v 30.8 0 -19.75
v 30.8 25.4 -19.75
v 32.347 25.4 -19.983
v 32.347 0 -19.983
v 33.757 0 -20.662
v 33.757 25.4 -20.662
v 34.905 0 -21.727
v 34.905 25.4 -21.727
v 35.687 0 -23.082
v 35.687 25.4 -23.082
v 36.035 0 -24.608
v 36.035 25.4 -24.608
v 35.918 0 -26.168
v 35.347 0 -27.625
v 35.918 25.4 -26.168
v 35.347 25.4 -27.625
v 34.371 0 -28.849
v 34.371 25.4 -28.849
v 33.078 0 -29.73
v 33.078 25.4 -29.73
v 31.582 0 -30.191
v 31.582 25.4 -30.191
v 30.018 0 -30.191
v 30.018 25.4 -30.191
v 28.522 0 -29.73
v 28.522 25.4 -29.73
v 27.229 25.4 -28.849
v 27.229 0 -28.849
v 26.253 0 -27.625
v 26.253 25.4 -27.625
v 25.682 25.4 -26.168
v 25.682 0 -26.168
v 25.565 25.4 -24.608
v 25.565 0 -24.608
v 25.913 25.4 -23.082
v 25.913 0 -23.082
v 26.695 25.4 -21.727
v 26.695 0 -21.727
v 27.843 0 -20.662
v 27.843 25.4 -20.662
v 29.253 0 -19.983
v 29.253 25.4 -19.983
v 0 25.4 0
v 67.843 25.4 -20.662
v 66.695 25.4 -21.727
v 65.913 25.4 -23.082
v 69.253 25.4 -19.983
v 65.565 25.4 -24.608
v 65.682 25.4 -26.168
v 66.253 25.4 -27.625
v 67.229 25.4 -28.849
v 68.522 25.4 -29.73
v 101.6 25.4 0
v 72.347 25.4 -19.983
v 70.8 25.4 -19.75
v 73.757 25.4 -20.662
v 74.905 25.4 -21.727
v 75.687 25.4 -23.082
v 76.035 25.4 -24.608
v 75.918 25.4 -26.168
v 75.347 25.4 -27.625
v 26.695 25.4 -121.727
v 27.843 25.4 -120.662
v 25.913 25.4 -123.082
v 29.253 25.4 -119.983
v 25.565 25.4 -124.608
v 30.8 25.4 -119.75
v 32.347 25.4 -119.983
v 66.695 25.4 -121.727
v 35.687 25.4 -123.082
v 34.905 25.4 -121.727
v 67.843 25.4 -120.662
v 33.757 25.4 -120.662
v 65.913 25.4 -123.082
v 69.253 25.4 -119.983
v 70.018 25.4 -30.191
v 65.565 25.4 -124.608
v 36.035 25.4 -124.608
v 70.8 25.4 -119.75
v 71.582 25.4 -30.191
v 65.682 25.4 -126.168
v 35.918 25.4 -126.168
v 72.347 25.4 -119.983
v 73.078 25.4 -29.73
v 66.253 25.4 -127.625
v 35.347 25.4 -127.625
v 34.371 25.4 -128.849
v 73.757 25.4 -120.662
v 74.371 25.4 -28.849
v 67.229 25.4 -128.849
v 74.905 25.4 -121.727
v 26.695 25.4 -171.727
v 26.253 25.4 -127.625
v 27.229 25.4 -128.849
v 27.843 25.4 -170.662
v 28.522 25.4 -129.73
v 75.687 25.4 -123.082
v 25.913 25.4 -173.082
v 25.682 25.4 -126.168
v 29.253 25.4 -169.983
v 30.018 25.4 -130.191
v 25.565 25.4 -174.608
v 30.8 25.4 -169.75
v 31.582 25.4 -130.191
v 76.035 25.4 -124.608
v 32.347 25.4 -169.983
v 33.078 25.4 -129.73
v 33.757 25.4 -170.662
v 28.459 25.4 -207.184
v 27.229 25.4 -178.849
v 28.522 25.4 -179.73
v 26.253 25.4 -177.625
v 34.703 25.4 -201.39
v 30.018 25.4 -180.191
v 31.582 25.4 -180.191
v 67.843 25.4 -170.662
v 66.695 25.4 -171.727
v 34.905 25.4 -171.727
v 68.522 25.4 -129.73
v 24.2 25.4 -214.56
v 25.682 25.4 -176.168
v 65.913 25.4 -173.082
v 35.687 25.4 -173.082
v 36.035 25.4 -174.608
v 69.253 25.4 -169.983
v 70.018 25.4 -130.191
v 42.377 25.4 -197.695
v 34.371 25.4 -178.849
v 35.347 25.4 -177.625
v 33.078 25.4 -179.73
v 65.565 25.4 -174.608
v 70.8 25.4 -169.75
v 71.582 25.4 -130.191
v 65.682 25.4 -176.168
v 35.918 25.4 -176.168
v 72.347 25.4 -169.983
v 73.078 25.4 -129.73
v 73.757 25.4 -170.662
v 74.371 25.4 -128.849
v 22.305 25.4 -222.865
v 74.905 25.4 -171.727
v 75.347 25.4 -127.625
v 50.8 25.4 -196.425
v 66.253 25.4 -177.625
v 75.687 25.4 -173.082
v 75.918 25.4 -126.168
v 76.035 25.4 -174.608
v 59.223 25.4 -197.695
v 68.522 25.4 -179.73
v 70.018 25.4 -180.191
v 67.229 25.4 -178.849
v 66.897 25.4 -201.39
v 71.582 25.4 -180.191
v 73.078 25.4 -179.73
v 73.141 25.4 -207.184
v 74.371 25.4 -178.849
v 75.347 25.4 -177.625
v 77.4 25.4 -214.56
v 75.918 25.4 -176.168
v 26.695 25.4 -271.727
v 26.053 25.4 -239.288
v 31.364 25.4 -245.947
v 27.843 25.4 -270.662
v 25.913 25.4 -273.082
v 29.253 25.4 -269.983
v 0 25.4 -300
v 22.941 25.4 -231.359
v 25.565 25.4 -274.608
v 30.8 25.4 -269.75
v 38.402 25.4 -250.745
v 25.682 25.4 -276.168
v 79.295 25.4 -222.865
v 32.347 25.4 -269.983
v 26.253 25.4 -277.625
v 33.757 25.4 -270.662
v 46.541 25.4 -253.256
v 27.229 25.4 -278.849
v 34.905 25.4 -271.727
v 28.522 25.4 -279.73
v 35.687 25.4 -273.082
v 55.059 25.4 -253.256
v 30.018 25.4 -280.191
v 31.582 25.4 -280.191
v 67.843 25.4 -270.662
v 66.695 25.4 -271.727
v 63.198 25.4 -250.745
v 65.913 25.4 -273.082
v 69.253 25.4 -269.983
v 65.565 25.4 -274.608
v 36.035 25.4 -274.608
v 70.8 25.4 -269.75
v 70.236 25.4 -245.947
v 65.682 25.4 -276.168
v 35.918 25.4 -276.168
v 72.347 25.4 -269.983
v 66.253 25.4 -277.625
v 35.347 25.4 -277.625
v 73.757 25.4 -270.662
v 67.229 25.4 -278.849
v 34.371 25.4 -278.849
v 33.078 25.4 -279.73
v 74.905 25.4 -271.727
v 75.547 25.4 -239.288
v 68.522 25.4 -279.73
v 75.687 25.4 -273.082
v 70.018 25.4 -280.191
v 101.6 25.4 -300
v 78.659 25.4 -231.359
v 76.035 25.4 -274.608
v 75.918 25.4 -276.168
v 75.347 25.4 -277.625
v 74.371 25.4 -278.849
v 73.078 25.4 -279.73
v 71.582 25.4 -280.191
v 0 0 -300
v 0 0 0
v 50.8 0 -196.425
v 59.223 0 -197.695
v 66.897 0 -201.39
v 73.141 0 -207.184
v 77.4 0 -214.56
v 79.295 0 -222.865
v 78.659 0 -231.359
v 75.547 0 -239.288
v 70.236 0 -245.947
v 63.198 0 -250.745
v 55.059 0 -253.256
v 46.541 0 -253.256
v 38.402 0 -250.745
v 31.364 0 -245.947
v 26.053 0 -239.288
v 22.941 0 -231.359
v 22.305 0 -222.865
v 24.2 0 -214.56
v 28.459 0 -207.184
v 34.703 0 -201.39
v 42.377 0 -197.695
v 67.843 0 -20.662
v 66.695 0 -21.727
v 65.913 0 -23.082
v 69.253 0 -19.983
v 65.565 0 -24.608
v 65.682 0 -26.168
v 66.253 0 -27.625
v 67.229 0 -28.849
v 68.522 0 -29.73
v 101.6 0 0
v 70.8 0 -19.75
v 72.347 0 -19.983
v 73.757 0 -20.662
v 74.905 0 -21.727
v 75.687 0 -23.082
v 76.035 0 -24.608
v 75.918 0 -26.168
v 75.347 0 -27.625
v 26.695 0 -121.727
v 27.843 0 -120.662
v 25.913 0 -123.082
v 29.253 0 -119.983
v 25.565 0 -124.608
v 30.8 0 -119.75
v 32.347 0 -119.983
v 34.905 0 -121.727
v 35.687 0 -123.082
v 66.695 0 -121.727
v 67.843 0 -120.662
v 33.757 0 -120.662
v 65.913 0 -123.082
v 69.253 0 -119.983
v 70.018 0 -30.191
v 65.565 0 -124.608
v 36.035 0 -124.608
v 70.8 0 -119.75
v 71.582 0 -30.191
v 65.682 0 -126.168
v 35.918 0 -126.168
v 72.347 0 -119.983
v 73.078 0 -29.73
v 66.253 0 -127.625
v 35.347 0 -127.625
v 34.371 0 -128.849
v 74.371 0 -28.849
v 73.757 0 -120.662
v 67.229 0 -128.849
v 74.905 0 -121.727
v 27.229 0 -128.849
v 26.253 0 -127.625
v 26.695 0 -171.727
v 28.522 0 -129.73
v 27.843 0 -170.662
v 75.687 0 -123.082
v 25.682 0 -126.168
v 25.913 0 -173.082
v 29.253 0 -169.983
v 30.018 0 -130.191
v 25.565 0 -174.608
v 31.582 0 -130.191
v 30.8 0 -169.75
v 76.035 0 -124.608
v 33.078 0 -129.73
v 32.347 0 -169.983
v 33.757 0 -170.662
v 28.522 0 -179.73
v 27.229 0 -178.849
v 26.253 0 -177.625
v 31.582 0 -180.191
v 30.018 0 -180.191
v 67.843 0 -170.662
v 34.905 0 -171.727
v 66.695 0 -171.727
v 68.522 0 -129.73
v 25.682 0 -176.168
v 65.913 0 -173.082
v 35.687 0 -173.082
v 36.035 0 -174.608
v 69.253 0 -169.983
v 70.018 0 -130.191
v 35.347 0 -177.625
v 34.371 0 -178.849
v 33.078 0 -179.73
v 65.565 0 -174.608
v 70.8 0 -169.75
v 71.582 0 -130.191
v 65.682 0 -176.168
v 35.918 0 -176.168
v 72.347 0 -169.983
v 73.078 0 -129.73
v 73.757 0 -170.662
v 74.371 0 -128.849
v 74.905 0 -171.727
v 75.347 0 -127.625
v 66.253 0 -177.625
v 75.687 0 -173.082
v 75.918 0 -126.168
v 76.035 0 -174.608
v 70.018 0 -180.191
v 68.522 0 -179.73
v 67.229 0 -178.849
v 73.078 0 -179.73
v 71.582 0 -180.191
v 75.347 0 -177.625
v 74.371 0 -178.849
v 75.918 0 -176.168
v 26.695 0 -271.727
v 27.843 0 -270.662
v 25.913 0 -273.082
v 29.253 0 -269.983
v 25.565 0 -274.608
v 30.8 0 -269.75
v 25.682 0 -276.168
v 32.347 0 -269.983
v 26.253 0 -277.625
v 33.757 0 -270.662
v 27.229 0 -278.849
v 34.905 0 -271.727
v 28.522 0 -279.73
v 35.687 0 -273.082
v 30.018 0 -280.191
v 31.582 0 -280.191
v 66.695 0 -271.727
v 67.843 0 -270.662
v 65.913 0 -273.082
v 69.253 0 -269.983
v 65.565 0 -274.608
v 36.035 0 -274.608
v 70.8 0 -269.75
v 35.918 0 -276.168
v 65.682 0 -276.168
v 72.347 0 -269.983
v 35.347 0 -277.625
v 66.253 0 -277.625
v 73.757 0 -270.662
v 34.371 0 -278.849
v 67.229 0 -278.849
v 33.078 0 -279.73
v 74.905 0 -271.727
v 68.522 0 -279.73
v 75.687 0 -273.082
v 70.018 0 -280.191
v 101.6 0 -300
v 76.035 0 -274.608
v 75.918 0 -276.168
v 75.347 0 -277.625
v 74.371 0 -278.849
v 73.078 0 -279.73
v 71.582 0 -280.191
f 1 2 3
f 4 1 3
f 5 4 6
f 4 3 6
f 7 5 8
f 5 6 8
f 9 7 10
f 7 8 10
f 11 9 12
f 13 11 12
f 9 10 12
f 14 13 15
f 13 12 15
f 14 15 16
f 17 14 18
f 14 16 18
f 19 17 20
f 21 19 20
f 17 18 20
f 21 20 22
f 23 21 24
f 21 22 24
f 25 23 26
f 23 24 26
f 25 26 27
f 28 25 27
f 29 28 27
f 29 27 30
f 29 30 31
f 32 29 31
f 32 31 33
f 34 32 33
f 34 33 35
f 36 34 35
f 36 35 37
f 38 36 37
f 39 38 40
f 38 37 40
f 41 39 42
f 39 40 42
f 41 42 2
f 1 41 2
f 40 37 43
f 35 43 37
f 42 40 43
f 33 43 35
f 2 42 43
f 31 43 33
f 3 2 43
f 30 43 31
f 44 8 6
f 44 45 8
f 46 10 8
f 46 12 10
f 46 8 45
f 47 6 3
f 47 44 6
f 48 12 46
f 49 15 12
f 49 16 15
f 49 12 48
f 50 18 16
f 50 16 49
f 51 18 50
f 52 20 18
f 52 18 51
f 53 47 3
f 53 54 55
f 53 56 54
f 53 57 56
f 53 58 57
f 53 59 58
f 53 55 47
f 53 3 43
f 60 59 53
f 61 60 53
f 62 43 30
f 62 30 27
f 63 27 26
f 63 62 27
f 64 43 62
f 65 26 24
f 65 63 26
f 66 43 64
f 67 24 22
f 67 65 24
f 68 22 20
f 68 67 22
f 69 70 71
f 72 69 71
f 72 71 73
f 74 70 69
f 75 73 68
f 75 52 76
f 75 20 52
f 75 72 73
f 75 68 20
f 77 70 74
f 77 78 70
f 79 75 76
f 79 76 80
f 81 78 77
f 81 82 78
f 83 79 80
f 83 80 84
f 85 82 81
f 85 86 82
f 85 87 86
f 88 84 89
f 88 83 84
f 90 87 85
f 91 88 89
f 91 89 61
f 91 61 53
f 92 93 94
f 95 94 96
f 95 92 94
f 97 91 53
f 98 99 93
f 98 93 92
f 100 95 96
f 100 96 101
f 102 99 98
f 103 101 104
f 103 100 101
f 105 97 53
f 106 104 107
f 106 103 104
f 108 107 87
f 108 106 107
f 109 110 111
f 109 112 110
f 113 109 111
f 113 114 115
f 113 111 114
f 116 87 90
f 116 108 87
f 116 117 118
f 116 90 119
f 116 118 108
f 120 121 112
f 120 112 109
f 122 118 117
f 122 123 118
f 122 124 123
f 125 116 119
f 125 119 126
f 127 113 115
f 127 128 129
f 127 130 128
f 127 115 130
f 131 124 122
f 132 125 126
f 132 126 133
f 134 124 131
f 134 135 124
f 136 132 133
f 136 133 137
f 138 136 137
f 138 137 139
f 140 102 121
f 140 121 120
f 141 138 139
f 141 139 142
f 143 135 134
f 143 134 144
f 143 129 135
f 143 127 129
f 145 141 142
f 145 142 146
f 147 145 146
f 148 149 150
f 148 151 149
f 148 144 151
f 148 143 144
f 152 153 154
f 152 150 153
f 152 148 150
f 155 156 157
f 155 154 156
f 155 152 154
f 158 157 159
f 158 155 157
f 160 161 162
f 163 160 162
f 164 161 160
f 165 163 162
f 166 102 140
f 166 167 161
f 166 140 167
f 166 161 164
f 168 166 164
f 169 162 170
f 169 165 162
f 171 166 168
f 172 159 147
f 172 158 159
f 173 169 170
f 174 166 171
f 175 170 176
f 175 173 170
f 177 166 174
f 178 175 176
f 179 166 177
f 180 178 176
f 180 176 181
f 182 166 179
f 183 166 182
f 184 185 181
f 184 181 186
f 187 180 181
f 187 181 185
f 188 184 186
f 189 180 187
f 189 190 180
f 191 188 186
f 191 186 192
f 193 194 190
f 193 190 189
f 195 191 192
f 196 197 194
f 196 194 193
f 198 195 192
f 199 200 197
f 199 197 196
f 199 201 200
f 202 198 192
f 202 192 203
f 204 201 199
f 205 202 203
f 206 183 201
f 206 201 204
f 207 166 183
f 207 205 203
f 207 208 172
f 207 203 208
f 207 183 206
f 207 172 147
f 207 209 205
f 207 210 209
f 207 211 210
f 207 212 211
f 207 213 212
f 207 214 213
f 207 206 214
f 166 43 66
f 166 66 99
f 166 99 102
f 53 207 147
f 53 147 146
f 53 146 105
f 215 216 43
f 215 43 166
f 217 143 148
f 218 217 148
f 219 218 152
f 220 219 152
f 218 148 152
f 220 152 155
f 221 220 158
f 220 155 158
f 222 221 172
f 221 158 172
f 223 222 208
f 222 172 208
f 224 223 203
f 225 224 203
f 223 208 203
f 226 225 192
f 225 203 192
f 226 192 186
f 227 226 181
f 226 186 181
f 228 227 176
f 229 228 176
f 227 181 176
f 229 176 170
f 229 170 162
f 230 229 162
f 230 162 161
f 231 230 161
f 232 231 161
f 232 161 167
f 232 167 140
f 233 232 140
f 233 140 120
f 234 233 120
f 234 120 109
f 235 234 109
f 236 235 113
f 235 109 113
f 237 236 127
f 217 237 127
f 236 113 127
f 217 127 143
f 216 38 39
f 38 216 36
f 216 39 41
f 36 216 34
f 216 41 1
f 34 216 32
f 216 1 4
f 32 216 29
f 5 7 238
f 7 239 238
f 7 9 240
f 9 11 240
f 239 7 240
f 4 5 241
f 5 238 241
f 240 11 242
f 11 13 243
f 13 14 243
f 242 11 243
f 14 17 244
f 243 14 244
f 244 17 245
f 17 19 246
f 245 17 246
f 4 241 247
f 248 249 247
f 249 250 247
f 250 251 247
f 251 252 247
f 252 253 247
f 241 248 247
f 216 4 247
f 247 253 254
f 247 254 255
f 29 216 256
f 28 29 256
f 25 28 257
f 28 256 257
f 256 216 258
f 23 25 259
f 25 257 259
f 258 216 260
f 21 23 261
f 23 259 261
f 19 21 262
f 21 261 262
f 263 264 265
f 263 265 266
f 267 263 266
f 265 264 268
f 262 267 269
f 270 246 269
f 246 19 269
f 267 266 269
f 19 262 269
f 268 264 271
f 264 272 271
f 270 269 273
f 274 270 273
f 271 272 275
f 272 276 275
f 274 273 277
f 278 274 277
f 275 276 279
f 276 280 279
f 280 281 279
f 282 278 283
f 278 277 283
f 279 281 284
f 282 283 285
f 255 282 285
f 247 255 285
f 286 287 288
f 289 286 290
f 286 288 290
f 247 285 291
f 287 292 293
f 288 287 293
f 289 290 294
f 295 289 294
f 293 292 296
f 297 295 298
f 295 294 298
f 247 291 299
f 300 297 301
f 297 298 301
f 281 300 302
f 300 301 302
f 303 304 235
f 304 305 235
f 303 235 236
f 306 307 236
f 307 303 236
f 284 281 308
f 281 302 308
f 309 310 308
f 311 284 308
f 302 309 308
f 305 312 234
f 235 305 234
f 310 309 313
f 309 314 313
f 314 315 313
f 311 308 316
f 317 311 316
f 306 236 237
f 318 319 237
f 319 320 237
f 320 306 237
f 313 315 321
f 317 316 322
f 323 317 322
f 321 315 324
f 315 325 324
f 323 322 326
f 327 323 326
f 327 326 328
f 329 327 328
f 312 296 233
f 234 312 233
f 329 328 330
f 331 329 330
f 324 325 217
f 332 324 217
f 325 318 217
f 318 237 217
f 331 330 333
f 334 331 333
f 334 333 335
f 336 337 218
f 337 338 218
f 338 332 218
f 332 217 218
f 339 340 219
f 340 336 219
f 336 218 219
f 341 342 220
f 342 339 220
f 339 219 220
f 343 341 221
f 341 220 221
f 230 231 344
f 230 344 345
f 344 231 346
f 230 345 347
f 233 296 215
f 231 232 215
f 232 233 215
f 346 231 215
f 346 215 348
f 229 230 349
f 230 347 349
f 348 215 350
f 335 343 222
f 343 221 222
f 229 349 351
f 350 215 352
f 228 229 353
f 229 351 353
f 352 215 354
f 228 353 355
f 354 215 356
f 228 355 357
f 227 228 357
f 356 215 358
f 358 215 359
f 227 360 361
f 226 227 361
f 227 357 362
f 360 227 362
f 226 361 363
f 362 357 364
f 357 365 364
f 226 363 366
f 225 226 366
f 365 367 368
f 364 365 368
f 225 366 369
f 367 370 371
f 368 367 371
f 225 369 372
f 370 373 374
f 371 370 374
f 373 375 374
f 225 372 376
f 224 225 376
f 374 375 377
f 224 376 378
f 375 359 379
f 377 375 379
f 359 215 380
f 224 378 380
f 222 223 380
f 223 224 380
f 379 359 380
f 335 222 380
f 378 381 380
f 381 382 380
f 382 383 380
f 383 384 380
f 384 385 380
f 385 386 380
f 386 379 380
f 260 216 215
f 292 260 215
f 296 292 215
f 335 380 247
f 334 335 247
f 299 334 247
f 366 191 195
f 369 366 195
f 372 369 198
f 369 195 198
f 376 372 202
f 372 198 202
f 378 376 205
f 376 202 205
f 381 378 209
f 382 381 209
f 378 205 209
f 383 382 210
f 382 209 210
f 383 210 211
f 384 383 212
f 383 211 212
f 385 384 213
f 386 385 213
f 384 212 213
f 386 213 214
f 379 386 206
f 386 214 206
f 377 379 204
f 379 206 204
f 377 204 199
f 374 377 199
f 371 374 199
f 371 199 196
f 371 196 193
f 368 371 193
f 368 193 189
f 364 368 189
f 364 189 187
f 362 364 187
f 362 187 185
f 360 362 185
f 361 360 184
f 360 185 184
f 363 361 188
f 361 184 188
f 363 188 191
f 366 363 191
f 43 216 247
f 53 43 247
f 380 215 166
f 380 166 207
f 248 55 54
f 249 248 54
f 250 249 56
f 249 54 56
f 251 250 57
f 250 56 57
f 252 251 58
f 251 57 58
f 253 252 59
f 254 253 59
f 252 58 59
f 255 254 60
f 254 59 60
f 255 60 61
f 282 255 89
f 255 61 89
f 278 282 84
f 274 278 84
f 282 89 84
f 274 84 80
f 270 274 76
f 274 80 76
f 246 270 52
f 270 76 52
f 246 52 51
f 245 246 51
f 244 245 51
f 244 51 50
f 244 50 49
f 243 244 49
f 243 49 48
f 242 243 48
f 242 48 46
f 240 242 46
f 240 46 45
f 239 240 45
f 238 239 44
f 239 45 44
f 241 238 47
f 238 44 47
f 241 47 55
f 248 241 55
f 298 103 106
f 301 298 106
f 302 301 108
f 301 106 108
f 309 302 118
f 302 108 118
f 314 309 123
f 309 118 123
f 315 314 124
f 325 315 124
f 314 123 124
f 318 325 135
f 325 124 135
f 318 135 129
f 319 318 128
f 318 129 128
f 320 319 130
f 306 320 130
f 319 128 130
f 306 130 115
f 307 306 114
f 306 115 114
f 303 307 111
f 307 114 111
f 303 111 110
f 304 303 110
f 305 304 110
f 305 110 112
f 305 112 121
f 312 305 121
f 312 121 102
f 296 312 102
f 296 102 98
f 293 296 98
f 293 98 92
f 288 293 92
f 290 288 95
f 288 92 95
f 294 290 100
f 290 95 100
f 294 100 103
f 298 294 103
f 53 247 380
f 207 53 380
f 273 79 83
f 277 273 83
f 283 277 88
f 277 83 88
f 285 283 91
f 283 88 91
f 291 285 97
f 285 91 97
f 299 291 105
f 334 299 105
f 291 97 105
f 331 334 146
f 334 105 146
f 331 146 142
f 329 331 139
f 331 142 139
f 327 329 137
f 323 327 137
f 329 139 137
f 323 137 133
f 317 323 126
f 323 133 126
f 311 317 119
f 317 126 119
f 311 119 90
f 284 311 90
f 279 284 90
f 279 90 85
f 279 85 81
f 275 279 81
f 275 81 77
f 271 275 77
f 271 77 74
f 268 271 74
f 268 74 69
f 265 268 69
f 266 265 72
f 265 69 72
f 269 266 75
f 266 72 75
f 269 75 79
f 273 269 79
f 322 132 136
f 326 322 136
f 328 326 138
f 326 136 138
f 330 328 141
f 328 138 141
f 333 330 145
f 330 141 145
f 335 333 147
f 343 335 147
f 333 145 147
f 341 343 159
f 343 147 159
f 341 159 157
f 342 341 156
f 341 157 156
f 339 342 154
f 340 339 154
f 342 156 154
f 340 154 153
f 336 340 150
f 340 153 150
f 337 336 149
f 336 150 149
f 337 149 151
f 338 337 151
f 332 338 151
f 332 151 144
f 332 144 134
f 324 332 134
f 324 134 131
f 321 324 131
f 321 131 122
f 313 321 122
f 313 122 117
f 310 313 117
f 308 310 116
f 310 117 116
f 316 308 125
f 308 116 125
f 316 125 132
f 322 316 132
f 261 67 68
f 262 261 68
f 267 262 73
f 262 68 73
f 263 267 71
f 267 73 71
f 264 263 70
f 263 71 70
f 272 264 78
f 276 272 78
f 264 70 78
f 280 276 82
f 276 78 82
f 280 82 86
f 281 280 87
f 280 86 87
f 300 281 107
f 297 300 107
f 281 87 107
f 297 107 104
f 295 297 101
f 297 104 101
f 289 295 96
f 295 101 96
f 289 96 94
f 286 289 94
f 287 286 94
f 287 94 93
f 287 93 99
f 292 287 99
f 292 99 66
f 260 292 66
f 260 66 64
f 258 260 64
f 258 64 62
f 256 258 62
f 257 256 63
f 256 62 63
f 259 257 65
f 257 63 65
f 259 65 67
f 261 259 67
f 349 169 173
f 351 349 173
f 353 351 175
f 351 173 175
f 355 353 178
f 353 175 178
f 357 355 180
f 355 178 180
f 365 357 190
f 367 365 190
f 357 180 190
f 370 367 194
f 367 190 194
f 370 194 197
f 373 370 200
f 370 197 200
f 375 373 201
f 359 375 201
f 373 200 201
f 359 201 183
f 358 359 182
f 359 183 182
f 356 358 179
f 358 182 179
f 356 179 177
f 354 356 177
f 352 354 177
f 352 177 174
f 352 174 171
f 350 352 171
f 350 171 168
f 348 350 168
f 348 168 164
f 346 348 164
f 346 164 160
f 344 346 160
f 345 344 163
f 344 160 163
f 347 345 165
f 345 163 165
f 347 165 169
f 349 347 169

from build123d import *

# Parameters (mm, degrees)
SKETCH2_W           = 101.6
SKETCH2_H           = 300
BOSS_EXTRUDE1_DEPTH = 25.4
SKETCH3_R           = 5.25
SKETCH3_R_2         = 28.575
CUT_EXTRUDE1_DEPTH  = 25.4
SKETCH4_R           = 5.25
CUT_EXTRUDE2_DEPTH  = 25.4


with BuildPart() as part:
    # Sketch2 → Boss-Extrude1 (new body)
    with BuildSketch(Plane(origin=(0, 0, 0), x_dir=(1, 0, 0), z_dir=(0, 1, 0))):
        with Locations((50.8, 150)):
            Rectangle(SKETCH2_W, SKETCH2_H)
    extrude(amount=BOSS_EXTRUDE1_DEPTH)

    # Sketch3 → Cut-Extrude1 (cut)
    with BuildSketch(Plane(origin=(0, 25.4, 0), x_dir=(1, 0, 0), z_dir=(0, 1, 0))):
        with Locations(Location((70.8, 275, 0), (0, 0, 270))):
            Circle(SKETCH3_R)
        with Locations(Location((30.8, 275, 0), (0, 0, 270))):
            Circle(SKETCH3_R)
        with Locations(Location((70.8, 175, 0), (0, 0, 270))):
            Circle(SKETCH3_R)
        with Locations(Location((30.8, 175, 0), (0, 0, 270))):
            Circle(SKETCH3_R)
        with Locations(Location((50.8, 225, 0), (0, 0, 270))):
            Circle(SKETCH3_R_2)
    extrude(amount=-CUT_EXTRUDE1_DEPTH, mode=Mode.SUBTRACT)

    # Sketch4 → Cut-Extrude2 (cut)
    with BuildSketch(Plane(origin=(0, 25.4, 0), x_dir=(1, 0, 0), z_dir=(0, 1, 0))):
        with Locations(Location((70.8, 125, 0), (0, 0, 270))):
            Circle(SKETCH4_R)
        with Locations(Location((30.8, 125, 0), (0, 0, 270))):
            Circle(SKETCH4_R)
        with Locations(Location((30.8, 25, 0), (0, 0, 270))):
            Circle(SKETCH4_R)
        with Locations(Location((70.8, 25, 0), (0, 0, 270))):
            Circle(SKETCH4_R)
    extrude(amount=-CUT_EXTRUDE2_DEPTH, mode=Mode.SUBTRACT)


solid = part.part
